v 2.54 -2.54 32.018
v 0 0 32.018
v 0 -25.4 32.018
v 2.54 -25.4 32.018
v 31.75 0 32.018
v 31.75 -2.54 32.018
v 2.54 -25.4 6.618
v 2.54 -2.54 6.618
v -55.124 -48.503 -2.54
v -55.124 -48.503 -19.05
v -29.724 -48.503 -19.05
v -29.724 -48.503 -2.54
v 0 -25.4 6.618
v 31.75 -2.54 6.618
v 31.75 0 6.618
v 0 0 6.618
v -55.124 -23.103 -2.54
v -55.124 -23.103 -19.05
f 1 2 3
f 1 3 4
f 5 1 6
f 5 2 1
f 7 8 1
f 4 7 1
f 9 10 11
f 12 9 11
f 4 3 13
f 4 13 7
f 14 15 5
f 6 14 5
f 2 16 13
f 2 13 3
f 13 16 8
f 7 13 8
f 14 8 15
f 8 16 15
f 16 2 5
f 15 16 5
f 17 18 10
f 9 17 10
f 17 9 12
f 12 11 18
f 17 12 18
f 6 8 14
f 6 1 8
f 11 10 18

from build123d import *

# Parameters (mm, degrees)
F0_W     = 31.75
F0_H     = 25.4
F1_DEPTH = 25.4
F2_T     = -2.54
F4_DEPTH = 19.05
F6_DEPTH = 2.54
F6_TAPER = -5


with BuildPart() as f1:
    # F0 (on Front) → F1 (new body)
    with BuildSketch(Plane.XZ):
        with Locations((15.875, 19.3175956197)):
            Rectangle(F0_W, F0_H)
    extrude(amount=F1_DEPTH)

    # F2
    f2_openings = [f1.faces().sort_by_distance(p)[0] for p in [
        (15.875, -25.4, 19.317596),
        (31.75, -12.7, 19.317596),
        (15.875, -12.7, 6.617596),
        (15.875, -12.7, 32.017596),
    ]]
    offset(amount=F2_T, openings=f2_openings)


with BuildPart() as f4:
    # F3 (on Top) → F4 (new body)
    with BuildSketch(Plane.XY):
        Polygon((-55.1244552851, -23.1033010297), (-55.1244552851, -48.5033010297), (-29.7244552851, -48.5033010297), align=None)
    extrude(amount=F4_DEPTH)


with BuildPart() as f4_1:
    # F5: moved
    add(f4.part.moved(Location((0, 0, -19.05))))

    # F4_face (on face) → F6 (cut)
    with BuildSketch(Plane(origin=(-46.6577886184, -40.036634363, 0), x_dir=(1, 0, 0), z_dir=(0, 0, 1))):
        Polygon((16.9333333333, -8.4666666667), (-8.4666666667, 16.9333333333), (-8.4666666667, -8.4666666667), align=None)
    extrude(amount=-F6_DEPTH, taper=F6_TAPER, mode=Mode.SUBTRACT)


solid = Compound([f1.part, f4_1.part])
